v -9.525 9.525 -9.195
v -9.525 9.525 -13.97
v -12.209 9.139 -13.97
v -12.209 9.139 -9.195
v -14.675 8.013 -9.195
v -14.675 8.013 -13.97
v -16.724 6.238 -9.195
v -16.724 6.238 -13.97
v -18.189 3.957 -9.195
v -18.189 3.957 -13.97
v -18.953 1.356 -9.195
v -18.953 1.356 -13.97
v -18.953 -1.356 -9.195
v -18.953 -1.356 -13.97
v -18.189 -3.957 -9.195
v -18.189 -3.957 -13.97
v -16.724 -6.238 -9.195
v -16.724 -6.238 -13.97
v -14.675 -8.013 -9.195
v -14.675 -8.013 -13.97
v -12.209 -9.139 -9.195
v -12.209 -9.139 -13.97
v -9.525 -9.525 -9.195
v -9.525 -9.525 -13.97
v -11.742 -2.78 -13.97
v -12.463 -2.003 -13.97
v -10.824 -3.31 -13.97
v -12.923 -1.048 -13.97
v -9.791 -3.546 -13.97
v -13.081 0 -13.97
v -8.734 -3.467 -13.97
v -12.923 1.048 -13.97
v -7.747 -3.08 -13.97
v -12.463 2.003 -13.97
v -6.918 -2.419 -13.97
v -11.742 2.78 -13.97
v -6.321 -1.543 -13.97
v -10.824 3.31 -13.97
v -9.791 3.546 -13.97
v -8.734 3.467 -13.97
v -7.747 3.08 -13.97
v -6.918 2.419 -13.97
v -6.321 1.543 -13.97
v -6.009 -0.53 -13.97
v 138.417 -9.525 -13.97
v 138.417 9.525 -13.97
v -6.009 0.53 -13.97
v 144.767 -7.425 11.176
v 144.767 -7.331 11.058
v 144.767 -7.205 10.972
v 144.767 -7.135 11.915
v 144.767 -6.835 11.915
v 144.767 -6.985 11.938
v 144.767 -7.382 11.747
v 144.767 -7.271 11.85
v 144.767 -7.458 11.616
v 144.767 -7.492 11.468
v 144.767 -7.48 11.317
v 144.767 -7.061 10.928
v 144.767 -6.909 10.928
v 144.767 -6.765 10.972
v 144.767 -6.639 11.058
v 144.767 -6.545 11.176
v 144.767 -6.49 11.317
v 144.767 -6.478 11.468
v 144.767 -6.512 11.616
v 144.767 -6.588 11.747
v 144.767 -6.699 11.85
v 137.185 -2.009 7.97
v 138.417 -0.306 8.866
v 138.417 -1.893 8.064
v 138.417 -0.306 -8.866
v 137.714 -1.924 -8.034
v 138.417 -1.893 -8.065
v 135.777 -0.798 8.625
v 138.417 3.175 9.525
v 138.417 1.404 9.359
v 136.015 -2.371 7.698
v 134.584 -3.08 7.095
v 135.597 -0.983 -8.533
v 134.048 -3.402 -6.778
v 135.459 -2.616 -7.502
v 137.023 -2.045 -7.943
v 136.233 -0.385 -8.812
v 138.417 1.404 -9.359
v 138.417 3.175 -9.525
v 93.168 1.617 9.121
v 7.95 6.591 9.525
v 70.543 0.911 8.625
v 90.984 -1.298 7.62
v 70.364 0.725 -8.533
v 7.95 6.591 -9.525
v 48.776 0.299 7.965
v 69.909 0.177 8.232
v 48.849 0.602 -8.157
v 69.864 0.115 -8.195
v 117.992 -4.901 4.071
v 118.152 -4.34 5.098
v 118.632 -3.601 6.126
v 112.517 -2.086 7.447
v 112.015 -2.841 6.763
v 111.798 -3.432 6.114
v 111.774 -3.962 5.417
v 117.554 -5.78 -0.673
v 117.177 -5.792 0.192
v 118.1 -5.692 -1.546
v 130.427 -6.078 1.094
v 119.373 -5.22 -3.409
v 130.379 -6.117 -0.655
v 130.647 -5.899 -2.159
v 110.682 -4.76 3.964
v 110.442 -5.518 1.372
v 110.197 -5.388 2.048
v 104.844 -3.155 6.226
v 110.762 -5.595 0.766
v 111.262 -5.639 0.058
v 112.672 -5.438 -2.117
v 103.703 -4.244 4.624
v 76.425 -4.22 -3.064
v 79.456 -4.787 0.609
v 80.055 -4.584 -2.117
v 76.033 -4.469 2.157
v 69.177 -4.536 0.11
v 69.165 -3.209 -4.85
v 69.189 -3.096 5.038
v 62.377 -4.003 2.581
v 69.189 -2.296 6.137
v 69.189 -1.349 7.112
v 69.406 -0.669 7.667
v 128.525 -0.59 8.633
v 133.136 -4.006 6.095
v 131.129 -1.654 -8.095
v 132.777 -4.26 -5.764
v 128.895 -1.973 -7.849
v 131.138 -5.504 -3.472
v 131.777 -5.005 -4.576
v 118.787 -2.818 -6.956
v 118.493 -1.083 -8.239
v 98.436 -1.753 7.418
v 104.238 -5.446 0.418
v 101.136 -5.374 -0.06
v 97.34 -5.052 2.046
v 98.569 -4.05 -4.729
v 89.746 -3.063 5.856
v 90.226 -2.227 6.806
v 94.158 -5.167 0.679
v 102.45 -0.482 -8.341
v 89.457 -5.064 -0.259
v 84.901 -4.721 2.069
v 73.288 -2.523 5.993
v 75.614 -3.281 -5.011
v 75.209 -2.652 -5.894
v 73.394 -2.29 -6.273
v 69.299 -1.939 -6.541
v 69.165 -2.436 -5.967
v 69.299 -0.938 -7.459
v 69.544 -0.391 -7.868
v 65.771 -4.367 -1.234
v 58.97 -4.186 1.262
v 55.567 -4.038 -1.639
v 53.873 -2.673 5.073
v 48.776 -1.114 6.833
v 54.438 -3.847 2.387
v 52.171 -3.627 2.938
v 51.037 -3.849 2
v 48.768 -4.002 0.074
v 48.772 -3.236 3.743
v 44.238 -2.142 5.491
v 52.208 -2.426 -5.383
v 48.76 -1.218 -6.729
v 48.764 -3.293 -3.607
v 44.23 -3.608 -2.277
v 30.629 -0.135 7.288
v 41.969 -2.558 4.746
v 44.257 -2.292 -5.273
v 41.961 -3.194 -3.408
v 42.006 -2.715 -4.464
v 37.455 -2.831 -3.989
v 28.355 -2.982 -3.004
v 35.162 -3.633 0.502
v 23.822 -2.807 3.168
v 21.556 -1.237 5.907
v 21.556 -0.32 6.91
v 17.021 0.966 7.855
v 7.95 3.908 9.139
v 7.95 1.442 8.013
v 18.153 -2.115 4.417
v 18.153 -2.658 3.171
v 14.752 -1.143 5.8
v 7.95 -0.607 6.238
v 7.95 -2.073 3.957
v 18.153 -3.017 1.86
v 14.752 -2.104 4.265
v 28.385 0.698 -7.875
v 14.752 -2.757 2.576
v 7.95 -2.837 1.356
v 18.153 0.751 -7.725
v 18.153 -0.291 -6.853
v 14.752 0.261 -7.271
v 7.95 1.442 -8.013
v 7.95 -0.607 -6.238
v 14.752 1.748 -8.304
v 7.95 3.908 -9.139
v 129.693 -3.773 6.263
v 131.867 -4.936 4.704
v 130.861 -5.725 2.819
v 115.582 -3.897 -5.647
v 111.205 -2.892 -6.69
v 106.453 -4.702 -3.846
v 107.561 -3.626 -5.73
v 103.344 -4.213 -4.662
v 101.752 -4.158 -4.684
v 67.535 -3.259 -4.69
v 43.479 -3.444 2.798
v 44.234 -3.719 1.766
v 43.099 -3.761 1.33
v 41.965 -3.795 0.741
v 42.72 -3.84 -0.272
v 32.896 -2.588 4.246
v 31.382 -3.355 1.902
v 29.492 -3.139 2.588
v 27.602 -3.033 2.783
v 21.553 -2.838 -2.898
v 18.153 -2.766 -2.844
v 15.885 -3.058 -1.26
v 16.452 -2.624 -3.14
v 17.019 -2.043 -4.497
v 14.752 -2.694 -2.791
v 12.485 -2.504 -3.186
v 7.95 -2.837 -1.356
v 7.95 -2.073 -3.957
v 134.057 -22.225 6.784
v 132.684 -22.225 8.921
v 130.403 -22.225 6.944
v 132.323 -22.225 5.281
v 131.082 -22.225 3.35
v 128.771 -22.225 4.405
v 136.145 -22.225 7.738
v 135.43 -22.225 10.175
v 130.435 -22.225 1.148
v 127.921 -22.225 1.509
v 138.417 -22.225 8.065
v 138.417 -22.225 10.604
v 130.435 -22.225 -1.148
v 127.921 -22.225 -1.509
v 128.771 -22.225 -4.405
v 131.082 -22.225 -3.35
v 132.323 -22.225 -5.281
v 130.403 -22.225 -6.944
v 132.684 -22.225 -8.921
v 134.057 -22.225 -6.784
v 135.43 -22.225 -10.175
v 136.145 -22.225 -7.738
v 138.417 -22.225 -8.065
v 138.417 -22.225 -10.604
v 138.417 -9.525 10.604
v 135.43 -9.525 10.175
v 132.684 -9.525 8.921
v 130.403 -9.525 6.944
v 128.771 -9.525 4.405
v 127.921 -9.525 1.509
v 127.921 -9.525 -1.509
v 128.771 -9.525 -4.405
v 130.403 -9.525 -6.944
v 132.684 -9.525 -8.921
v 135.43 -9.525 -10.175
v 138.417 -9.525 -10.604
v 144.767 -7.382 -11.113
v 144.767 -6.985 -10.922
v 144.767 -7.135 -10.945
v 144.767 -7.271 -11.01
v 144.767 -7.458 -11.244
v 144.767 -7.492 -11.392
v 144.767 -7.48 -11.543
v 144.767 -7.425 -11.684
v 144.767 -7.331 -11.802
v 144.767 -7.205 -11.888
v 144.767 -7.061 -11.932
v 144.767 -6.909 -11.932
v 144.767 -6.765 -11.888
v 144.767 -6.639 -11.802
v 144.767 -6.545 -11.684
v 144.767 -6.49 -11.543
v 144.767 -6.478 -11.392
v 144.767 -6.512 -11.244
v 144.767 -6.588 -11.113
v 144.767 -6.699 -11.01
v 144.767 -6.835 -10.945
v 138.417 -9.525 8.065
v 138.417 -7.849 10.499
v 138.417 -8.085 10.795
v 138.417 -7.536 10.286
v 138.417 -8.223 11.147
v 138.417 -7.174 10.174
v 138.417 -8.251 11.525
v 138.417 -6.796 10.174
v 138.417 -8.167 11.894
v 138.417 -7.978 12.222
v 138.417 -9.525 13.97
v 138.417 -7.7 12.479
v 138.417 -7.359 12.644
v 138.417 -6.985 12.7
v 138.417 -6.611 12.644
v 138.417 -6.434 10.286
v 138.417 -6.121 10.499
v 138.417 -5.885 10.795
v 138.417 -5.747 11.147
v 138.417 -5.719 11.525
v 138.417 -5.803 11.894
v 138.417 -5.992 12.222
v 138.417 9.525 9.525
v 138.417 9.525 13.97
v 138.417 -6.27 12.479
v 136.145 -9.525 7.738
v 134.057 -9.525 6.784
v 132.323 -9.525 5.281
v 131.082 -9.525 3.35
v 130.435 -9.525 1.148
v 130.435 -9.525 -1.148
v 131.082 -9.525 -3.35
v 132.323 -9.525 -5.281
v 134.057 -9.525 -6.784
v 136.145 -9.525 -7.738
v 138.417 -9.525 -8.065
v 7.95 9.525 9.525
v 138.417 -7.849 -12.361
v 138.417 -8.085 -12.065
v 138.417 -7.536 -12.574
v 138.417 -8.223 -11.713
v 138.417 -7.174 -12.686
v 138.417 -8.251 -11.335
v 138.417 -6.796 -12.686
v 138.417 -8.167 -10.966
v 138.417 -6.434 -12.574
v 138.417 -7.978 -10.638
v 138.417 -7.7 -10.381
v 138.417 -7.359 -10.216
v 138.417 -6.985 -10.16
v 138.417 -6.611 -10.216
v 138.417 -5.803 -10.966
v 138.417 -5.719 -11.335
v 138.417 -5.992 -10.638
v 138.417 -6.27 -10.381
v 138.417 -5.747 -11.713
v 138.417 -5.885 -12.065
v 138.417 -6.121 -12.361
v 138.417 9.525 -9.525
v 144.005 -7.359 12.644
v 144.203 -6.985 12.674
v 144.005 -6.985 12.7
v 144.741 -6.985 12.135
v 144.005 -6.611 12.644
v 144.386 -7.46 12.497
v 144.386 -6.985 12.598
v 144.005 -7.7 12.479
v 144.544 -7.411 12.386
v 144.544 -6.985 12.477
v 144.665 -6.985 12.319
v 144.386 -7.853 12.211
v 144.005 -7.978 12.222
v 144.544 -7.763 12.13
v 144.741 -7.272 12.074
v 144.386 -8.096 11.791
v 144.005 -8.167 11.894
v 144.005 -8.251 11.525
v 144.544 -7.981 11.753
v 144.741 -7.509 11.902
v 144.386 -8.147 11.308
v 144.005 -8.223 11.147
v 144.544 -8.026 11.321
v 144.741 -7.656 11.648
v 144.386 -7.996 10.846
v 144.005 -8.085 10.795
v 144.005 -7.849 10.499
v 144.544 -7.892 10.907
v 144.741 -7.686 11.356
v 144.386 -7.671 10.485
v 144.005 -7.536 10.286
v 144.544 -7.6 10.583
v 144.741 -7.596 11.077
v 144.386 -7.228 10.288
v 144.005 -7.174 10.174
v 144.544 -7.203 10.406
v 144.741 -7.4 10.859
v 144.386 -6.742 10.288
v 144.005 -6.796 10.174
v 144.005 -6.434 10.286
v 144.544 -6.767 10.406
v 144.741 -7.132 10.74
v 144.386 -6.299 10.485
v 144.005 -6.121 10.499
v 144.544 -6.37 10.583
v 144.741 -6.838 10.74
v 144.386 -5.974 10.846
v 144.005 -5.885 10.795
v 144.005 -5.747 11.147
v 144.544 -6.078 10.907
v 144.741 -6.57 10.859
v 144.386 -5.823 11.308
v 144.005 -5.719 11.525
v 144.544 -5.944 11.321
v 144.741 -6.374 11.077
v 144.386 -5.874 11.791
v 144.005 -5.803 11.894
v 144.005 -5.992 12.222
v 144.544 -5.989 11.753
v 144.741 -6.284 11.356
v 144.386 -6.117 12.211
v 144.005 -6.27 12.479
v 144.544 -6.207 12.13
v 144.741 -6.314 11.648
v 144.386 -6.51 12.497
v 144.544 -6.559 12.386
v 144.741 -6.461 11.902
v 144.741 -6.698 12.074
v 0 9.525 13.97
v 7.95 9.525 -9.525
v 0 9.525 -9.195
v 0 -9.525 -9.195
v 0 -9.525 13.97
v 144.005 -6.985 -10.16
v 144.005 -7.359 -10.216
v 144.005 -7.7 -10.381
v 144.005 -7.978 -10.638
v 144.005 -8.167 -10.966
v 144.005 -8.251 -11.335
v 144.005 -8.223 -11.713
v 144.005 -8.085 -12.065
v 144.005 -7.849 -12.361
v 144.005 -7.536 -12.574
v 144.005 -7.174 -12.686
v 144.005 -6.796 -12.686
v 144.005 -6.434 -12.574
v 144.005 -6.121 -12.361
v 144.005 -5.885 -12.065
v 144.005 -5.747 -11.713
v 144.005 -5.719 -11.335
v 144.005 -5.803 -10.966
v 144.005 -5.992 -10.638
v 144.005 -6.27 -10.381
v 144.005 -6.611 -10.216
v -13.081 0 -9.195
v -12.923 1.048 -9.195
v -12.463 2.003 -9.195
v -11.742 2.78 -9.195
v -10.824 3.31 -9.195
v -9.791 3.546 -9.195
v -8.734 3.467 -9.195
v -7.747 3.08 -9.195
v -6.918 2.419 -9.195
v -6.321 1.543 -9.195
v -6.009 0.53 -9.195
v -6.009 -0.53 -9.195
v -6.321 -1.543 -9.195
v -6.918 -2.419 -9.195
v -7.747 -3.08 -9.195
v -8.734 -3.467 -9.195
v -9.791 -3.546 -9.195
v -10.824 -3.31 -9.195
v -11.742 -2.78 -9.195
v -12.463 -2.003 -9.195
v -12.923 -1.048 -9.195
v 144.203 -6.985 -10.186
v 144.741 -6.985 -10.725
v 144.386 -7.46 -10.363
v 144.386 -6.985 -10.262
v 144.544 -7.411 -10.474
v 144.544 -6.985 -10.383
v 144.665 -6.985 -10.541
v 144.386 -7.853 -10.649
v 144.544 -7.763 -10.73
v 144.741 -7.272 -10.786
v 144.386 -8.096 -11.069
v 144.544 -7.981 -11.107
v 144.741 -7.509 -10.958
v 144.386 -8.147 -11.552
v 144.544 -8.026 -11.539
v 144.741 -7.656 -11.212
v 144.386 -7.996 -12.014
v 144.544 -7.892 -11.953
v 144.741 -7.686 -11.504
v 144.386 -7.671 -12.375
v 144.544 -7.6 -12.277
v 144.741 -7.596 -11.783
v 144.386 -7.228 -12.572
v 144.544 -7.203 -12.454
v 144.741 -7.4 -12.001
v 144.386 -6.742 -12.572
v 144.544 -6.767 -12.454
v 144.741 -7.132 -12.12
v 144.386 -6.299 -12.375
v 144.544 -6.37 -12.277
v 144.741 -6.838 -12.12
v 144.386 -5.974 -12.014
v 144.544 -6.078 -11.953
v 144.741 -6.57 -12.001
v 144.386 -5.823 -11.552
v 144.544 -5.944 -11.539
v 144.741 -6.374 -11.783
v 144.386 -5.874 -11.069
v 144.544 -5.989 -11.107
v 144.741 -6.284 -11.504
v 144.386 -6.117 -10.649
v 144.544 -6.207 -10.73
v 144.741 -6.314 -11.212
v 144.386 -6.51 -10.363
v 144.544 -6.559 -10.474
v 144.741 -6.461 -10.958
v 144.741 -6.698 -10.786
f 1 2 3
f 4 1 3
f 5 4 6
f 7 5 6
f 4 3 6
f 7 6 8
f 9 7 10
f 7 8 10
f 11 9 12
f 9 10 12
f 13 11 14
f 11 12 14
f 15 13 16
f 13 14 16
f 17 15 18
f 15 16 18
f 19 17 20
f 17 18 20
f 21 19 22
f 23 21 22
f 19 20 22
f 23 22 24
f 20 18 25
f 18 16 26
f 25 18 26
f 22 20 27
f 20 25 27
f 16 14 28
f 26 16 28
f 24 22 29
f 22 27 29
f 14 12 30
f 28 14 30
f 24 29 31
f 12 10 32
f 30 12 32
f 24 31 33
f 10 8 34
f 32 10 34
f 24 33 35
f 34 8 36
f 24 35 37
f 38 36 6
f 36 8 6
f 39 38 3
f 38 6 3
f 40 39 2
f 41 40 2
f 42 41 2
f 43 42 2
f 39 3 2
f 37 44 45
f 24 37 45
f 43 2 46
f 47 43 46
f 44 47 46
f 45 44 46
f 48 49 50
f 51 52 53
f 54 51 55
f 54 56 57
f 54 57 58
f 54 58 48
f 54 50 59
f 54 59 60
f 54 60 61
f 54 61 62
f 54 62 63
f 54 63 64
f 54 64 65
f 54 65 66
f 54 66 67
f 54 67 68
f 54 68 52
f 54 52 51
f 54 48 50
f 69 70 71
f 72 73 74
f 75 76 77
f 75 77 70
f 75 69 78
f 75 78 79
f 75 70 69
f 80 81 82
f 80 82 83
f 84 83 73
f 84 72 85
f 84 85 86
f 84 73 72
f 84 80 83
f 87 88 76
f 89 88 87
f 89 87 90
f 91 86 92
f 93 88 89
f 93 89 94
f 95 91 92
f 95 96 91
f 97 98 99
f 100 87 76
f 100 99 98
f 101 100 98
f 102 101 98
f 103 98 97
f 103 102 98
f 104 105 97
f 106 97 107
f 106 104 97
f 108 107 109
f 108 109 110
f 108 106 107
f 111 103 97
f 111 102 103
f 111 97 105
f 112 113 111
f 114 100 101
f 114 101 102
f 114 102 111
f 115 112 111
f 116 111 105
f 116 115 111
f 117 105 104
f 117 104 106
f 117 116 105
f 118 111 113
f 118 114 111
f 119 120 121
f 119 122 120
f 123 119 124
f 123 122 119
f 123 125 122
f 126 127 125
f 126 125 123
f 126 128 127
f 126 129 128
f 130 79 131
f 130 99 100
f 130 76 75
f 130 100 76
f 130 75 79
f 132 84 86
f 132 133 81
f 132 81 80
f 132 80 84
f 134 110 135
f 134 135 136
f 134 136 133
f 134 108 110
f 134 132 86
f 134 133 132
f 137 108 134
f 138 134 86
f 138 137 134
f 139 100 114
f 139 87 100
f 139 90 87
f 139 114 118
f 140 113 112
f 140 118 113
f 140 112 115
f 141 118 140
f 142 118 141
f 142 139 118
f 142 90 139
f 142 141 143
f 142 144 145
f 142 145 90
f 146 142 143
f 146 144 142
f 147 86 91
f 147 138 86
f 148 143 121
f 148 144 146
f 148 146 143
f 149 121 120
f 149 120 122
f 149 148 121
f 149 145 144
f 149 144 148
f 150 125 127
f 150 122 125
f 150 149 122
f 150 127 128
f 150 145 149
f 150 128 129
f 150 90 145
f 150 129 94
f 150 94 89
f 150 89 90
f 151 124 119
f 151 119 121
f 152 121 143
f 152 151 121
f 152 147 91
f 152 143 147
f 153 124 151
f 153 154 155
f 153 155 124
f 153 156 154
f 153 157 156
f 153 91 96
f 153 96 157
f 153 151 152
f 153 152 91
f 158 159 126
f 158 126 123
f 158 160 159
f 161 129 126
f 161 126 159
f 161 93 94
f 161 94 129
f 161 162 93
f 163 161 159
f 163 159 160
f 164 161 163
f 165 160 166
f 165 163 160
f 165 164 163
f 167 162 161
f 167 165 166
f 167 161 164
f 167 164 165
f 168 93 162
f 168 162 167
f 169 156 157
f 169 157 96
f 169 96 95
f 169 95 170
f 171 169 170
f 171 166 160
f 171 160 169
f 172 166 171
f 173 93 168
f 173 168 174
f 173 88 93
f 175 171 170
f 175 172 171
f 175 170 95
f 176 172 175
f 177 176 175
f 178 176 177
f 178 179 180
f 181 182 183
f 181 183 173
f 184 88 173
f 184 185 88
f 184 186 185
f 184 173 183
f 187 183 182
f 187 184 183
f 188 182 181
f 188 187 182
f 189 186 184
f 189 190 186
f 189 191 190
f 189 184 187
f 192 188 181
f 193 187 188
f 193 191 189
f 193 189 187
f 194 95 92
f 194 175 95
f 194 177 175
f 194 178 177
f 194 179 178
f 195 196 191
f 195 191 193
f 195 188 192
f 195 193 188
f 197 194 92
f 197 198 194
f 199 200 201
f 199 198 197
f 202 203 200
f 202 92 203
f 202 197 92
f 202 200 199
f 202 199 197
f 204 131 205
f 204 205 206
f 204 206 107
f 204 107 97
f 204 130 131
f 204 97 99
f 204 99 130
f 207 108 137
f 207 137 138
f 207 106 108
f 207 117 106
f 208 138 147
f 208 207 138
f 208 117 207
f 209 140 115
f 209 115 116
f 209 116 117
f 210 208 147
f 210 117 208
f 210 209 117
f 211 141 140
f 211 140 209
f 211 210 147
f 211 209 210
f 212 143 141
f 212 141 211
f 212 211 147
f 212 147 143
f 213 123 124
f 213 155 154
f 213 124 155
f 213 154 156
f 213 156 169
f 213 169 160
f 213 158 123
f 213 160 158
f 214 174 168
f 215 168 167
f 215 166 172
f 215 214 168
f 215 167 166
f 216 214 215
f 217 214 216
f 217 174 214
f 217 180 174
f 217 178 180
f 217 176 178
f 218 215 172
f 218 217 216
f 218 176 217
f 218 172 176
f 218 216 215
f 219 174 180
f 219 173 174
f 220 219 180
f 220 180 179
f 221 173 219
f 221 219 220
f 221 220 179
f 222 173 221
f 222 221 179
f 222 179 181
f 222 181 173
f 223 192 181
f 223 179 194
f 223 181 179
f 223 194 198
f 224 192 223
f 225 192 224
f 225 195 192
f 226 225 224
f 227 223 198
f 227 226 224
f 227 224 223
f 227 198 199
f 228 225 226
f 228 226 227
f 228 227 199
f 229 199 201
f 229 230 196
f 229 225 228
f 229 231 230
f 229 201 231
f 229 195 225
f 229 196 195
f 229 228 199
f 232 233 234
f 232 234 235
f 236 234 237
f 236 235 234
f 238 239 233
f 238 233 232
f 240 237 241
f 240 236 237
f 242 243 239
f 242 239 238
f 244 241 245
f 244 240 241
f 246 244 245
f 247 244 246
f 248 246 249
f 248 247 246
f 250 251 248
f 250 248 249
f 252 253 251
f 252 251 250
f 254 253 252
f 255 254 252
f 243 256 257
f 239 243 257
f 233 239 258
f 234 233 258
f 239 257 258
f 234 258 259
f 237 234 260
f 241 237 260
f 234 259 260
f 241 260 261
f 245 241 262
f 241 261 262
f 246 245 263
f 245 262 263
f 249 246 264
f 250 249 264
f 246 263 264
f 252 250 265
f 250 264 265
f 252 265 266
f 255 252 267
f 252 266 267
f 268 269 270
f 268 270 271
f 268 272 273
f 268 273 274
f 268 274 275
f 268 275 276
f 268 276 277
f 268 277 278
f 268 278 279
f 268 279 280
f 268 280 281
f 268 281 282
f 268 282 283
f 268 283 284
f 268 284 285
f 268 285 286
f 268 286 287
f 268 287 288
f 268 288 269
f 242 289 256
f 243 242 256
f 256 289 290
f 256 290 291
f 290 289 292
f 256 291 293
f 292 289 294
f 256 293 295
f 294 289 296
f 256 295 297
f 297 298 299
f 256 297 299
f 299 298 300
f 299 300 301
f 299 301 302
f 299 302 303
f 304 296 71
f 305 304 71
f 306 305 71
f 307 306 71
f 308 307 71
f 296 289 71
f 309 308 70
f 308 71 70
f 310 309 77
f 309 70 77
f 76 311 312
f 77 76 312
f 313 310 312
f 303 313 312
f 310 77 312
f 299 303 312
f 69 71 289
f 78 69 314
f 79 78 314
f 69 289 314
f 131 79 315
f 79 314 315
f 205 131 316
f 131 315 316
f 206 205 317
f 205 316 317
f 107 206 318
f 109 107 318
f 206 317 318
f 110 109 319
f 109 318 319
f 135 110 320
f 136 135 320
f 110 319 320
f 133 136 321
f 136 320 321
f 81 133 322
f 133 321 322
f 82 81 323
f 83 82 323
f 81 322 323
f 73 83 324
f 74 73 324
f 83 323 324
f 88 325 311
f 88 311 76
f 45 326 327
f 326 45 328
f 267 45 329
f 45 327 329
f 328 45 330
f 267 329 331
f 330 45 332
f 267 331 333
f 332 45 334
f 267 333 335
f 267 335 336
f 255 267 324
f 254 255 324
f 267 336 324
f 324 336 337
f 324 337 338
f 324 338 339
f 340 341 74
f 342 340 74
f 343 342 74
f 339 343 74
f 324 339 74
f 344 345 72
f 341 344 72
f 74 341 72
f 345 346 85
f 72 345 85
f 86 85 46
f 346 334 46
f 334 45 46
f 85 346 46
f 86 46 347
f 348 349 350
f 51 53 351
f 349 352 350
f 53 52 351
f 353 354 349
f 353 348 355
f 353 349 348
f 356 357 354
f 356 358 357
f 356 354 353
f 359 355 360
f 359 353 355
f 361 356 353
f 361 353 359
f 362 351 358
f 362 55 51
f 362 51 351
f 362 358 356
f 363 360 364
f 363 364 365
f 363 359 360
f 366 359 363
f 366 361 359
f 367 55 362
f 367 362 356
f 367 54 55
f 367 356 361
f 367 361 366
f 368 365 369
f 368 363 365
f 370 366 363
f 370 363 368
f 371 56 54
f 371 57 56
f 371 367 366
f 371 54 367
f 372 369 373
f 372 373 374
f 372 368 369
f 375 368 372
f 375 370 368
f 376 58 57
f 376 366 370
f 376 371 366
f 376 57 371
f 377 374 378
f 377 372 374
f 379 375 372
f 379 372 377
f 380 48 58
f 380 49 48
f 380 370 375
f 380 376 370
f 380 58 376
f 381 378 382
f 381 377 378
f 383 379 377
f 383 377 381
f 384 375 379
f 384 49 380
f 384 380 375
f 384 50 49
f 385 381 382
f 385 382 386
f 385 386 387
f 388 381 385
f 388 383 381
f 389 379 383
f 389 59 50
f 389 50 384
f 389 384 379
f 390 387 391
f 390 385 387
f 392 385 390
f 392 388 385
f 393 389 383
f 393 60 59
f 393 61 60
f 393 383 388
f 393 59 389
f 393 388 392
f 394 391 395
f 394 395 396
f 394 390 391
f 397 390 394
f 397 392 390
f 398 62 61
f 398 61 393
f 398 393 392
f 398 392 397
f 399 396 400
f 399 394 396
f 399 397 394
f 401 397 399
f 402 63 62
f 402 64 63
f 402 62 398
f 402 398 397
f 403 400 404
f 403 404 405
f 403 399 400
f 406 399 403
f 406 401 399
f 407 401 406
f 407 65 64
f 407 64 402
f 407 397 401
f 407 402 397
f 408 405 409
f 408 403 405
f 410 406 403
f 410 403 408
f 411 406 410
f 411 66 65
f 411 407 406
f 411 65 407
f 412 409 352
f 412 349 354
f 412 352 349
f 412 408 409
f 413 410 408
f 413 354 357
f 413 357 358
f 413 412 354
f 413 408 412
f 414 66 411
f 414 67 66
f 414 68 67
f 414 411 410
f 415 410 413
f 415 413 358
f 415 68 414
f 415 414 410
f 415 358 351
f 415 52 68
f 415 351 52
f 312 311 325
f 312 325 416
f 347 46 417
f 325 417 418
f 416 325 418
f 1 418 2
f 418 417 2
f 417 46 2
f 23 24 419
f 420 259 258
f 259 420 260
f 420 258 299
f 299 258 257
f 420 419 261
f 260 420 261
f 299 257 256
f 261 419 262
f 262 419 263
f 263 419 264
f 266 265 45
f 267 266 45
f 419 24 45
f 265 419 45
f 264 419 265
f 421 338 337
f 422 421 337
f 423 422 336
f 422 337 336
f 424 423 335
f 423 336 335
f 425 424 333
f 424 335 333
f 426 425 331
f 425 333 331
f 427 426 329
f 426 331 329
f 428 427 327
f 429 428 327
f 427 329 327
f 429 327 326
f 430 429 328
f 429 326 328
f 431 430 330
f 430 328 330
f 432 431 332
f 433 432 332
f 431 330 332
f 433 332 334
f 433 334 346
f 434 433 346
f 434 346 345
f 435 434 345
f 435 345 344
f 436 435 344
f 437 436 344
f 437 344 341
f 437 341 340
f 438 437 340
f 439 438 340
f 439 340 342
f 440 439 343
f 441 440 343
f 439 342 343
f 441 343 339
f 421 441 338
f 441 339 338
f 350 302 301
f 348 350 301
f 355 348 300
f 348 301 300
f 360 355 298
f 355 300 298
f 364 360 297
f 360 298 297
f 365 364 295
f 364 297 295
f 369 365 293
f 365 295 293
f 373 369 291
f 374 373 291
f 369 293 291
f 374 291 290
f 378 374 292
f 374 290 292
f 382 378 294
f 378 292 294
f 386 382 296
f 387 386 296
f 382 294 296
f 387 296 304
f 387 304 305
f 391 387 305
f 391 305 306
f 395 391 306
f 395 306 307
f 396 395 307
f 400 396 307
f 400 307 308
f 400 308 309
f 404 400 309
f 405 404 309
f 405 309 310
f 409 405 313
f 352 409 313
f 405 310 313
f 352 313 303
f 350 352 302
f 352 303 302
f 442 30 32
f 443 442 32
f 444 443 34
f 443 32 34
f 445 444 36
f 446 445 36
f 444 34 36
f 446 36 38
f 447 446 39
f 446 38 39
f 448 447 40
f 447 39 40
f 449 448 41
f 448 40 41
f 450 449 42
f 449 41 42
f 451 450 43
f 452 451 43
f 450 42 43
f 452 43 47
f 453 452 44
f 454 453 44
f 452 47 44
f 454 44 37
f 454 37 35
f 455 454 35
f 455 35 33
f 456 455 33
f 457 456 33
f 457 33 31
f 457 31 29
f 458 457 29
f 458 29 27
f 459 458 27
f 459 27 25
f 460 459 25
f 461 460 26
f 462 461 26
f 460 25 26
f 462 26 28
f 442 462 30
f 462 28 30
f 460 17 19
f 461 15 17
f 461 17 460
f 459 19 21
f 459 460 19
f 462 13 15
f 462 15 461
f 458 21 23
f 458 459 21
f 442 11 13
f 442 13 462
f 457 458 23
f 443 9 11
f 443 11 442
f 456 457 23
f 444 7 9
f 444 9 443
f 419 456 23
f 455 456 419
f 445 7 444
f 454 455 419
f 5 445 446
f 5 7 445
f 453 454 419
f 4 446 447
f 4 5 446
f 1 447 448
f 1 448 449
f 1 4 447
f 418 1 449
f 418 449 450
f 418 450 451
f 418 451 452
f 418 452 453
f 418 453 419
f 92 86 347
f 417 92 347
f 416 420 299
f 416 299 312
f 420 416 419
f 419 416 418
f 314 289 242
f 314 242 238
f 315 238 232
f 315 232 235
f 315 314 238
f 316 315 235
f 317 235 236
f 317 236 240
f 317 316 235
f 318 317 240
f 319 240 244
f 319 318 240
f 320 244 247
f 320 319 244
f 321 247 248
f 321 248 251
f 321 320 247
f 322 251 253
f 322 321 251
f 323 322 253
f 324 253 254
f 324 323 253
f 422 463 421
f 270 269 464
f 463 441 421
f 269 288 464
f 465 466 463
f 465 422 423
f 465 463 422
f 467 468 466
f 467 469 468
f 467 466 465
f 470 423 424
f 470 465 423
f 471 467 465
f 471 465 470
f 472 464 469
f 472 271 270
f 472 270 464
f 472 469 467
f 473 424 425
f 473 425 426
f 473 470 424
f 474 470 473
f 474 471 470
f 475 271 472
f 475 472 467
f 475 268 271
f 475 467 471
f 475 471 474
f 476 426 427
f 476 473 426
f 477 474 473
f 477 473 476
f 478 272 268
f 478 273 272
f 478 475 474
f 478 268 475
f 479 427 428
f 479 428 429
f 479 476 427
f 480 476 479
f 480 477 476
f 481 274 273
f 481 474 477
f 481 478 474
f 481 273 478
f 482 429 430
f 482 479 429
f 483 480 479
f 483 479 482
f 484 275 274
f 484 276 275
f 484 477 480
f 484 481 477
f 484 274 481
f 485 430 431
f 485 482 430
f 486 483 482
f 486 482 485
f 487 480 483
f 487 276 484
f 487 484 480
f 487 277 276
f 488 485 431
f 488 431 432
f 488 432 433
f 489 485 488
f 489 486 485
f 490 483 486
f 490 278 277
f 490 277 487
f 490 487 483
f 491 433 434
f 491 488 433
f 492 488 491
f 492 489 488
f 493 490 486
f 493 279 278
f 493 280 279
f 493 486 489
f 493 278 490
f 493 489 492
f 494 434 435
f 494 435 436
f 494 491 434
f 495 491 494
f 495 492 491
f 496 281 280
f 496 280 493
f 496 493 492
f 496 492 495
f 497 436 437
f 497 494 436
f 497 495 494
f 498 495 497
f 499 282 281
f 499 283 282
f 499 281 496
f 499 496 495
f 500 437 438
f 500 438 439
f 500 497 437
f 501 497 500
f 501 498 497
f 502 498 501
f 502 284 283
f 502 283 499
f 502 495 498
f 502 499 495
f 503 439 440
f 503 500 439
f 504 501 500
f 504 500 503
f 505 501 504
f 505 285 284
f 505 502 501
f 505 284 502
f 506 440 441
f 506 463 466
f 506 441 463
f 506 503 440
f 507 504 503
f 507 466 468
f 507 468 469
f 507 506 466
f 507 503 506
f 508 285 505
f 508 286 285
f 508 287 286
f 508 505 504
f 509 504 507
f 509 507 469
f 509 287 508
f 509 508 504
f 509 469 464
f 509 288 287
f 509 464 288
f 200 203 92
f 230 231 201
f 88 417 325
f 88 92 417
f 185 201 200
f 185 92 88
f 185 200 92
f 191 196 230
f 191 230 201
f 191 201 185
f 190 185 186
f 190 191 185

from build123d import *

# Parameters (mm, degrees)
SKETCH1_W           = 27.94
SKETCH1_H           = 19.05
BOSS_EXTRUDE1_DEPTH = 138.4173
SKETCH5_R           = 3.556
BOSS_EXTRUDE2_DEPTH = 4.7752
SKETCH6_R           = 10.6045
SKETCH6_R_2         = 8.0645
BOSS_EXTRUDE3_DEPTH = 12.7
SKETCH8_R           = 8.0645
CUT_EXTRUDE2_DEPTH  = 151.882604283
SKETCH9_W           = 32.717360996
SKETCH9_H           = 24.765
CUT_EXTRUDE3_DEPTH  = 151.882604283
SKETCH10_R          = 1.27
BOSS_EXTRUDE4_DEPTH = 6.35
FILLET1_R           = 0.762


with BuildPart() as part:
    # Sketch1 → Boss-Extrude1 (new body)
    with BuildSketch(Plane(origin=(0, 0, 0), x_dir=(0, 0, -1), z_dir=(1, 0, 0))):
        Rectangle(SKETCH1_W, SKETCH1_H)
    extrude(amount=BOSS_EXTRUDE1_DEPTH)

    # Cut-Sweep1: sweep along a path in Sketch3
    with BuildLine(Plane.XY) as cut_sweep1_path:
        Line((138.4173, 9.525), (7.9502, 12.941401248))
    # Sketch2 → Cut-Sweep1 (sweep, cut)
    with BuildSketch(Plane(origin=(138.4173, 0, 0), x_dir=(0, 0, -1), z_dir=(1, 0, 0))):
        with BuildLine():
            Line((-9.525, 3.175), (-9.525, 9.525))
            Line((-9.525, 9.525), (9.525, 9.525))
            Line((9.525, 9.525), (9.525, 3.175))
            ThreePointArc((9.525, 3.175), (0, -6.35), (-9.525, 3.175))
        make_face()
    sweep(path=cut_sweep1_path.line, mode=Mode.SUBTRACT)

    # Sketch5 → Boss-Extrude2 (add)
    with BuildSketch(Plane(origin=(0, 0, -13.97), x_dir=(-1, 0, 0), z_dir=(0, 0, -1))):
        with BuildLine():
            Line((0, -9.525), (0, 9.525))
            Line((0, 9.525), (9.525, 9.525))
            ThreePointArc((9.525, 9.525), (19.05, 0), (9.525, -9.525))
            Line((9.525, -9.525), (0, -9.525))
        make_face()
        with Locations((9.525, 0)):
            Circle(SKETCH5_R, mode=Mode.SUBTRACT)
    extrude(amount=-BOSS_EXTRUDE2_DEPTH)

    # Sketch6 → Boss-Extrude3 (add)
    with BuildSketch(Plane.XZ.offset(9.525)):
        with Locations(Location((138.4173, 0, 0), (0, 0, 270))):
            Circle(SKETCH6_R)
        with Locations(Location((138.4173, 0, 0), (0, 0, 270))):
            Circle(SKETCH6_R_2, mode=Mode.SUBTRACT)
    extrude(amount=BOSS_EXTRUDE3_DEPTH)

    # Sketch8 → Cut-Extrude2 (cut, through all)
    with BuildSketch(Plane.XZ.offset(9.525)):
        with Locations(Location((138.4173, 0, 0), (0, 0, 270))):
            Circle(SKETCH8_R)
    extrude(amount=-CUT_EXTRUDE2_DEPTH, mode=Mode.SUBTRACT)

    # Sketch9 → Cut-Extrude3 (cut, through all)
    with BuildSketch(Plane.XZ.offset(9.525)):
        with Locations((154.775980498, 1.5875)):
            Rectangle(SKETCH9_W, SKETCH9_H)
    extrude(amount=CUT_EXTRUDE3_DEPTH, mode=Mode.SUBTRACT)

    # Sketch10 → Boss-Extrude4 (add)
    with BuildSketch(Plane(origin=(138.4173, 0, 0), x_dir=(0, 0, -1), z_dir=(1, 0, 0))):
        with Locations(Location((-11.43, -6.985, 0), (0, 0, 180))):
            Circle(SKETCH10_R)
        with Locations(Location((11.43, -6.985, 0), (0, 0, 180))):
            Circle(SKETCH10_R)
    extrude(amount=BOSS_EXTRUDE4_DEPTH)

    # Fillet1
    fillet1_edges = [part.edges().sort_by_distance(p)[0] for p in [
        (144.7673, -6.985, 10.16),
        (144.7673, -6.985, -12.7),
    ]]
    fillet(fillet1_edges, radius=FILLET1_R)


solid = part.part
